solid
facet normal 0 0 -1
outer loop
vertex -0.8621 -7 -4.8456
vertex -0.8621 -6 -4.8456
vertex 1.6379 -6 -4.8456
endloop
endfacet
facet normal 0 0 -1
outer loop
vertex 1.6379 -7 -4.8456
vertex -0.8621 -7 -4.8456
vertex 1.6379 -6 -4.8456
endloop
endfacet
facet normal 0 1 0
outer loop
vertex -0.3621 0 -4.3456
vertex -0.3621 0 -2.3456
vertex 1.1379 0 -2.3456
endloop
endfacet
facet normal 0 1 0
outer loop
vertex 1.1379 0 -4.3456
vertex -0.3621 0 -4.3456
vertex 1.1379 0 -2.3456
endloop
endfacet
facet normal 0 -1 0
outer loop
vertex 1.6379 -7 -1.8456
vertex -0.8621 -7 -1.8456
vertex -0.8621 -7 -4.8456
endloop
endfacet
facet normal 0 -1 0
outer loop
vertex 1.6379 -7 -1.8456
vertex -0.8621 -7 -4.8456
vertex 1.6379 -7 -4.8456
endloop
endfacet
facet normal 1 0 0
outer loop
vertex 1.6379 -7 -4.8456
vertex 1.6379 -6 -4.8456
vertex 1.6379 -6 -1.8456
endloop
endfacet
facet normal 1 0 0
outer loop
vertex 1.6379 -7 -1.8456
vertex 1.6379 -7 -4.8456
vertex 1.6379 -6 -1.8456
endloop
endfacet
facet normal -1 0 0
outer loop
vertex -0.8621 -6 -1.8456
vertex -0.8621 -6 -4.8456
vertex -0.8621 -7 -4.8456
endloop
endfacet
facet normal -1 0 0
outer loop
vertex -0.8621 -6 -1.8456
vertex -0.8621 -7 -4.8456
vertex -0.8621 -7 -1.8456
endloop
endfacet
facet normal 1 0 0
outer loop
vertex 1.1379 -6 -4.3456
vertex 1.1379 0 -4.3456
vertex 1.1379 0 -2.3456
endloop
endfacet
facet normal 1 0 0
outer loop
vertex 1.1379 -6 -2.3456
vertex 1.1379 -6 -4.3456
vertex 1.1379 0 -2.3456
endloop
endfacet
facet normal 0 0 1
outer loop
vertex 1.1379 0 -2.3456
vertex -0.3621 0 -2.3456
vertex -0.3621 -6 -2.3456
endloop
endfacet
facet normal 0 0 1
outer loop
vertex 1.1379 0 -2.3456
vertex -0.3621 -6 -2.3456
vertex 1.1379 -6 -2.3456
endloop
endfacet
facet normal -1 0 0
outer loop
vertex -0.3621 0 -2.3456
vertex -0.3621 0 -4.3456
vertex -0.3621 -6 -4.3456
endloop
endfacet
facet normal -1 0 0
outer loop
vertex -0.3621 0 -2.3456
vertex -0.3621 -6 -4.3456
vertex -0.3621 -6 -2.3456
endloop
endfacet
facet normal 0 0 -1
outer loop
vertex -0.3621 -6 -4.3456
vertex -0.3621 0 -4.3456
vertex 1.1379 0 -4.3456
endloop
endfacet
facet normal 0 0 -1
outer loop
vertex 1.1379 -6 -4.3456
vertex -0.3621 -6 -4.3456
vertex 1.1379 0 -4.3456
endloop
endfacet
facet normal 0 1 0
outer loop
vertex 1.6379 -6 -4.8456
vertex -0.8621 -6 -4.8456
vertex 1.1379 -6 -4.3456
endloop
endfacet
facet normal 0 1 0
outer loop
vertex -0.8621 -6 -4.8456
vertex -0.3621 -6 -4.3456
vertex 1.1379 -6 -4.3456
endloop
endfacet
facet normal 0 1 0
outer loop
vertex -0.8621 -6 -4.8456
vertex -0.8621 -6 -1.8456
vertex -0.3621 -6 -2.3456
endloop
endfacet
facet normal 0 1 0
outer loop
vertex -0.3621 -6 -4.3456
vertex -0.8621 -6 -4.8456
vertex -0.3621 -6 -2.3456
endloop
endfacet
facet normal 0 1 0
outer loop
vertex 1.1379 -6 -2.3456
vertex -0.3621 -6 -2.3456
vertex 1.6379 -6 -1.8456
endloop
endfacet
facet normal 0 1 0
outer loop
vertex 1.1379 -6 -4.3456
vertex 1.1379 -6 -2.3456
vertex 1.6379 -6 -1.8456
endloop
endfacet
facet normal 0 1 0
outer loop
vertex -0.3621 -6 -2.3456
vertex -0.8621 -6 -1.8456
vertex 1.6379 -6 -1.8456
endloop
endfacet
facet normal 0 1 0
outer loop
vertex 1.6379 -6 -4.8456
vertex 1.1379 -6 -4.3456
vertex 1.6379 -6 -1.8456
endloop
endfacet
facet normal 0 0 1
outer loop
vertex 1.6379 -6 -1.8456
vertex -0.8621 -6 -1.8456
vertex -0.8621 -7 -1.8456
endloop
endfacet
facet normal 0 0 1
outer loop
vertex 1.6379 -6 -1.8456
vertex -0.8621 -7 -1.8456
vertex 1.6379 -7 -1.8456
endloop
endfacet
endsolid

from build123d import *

# Parameters (mm, degrees)
F0_W     = 1.5
F0_H     = 2
F1_DEPTH = 6
F2_W     = 2.5
F2_H     = 3
F3_DEPTH = 1
F4_DEPTH = 1


with BuildPart() as f1:
    # F0 (on Front) → F1 (new body)
    with BuildSketch(Plane.XZ):
        with Locations((0.387931, -3.345636)):
            Rectangle(F0_W, F0_H)
    extrude(amount=F1_DEPTH)

    # F2 (on face) → F3 (join)
    with BuildSketch(Plane.XZ.offset(6)):
        with Locations((0.387931, -3.345636)):
            Rectangle(F2_W, F2_H)
    extrude(amount=F3_DEPTH)

    # F2 (on face) → F4 (join)
    with BuildSketch(Plane.XZ.offset(6)):
        with Locations((0.387931, -3.345636)):
            Rectangle(F2_W, F2_H)
    extrude(amount=F4_DEPTH)


solid = f1.part
